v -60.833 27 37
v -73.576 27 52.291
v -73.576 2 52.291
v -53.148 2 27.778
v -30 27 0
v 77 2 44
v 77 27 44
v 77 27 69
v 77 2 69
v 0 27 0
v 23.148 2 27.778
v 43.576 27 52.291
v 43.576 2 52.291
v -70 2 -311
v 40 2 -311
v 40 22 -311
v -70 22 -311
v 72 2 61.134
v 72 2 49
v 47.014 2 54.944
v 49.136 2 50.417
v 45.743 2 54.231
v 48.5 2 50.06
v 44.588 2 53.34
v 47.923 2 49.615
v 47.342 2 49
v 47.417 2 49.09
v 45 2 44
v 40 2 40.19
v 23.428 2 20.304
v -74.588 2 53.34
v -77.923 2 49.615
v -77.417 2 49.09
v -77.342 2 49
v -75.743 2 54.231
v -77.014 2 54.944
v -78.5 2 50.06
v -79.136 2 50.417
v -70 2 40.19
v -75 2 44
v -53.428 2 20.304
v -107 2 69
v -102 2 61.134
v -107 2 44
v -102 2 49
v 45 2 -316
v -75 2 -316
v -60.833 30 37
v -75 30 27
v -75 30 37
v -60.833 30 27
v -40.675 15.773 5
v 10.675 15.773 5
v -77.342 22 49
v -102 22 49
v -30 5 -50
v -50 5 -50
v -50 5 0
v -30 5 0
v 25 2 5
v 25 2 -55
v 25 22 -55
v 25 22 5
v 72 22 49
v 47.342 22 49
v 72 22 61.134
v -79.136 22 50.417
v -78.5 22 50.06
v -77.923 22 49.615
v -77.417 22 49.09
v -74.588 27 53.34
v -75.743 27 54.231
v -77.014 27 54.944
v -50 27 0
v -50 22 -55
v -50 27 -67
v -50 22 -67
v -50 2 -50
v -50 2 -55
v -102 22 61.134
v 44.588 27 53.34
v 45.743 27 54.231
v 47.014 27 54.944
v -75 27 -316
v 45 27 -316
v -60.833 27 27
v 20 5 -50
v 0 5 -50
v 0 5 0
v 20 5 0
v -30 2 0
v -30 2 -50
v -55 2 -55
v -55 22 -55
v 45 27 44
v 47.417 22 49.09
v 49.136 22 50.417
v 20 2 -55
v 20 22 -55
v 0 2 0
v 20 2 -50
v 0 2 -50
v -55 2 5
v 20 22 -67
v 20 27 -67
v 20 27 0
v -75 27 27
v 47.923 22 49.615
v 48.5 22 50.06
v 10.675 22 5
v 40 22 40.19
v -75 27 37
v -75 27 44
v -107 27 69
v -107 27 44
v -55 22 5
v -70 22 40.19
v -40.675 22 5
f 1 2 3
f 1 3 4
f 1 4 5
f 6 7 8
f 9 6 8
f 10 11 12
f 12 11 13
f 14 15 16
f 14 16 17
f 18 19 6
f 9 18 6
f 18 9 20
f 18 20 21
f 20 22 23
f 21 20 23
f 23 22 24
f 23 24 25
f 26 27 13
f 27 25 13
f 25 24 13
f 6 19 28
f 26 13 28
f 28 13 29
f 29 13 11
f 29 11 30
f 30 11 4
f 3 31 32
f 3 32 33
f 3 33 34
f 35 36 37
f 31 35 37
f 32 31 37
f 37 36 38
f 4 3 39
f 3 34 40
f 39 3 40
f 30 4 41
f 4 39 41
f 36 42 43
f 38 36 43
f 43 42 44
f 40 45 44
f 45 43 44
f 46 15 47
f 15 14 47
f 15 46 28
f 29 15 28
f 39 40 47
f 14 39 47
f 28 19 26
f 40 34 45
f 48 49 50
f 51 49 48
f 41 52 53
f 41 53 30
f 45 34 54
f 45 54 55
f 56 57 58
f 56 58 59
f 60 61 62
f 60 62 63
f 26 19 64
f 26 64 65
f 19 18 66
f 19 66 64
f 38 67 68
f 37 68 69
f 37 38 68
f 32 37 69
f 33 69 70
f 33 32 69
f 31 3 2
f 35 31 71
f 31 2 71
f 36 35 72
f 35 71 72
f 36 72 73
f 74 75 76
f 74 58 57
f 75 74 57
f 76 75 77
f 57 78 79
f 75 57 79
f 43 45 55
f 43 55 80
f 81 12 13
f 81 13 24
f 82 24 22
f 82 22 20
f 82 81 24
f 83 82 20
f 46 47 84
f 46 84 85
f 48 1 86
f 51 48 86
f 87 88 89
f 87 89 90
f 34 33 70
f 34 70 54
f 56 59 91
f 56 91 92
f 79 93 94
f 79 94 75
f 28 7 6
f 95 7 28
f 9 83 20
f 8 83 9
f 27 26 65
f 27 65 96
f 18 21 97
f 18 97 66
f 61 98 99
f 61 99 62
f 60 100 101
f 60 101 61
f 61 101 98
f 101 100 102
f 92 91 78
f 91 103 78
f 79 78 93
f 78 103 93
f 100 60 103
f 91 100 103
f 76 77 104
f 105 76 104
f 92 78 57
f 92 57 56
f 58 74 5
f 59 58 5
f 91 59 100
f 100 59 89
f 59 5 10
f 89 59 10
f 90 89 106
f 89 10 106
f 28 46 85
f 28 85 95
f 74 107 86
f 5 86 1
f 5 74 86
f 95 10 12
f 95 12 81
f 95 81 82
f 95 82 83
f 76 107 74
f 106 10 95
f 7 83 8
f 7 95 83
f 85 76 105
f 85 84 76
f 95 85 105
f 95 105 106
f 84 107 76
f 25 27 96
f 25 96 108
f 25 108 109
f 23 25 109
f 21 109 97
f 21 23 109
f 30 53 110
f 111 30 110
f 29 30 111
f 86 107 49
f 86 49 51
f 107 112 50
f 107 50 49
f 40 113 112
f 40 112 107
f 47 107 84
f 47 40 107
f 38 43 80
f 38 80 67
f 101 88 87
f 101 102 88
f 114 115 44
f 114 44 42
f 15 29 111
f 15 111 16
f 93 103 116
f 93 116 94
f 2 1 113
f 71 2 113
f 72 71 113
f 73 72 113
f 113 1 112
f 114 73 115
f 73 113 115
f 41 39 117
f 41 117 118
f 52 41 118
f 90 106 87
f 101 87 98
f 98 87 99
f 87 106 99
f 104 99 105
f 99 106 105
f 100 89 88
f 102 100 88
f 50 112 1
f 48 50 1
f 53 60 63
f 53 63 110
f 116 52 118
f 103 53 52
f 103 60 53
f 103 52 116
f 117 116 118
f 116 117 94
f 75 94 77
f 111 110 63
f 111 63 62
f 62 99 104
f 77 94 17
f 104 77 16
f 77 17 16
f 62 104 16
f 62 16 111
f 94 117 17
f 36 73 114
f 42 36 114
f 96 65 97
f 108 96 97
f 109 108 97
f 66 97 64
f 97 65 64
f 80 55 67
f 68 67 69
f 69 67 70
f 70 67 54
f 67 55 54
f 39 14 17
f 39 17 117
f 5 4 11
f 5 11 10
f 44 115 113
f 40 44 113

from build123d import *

# Parameters (mm, degrees)
BOSS_EXTRUDE1_DEPTH      = 27
CUT_EXTRUDE1_DEPTH       = 29
CUT_EXTRUDE1_DEPTH_BACK  = 70
BOSS_EXTRUDE2_DEPTH      = 27
SKETCH9_W                = 14.166666667
SKETCH9_H                = 10
BOSS_EXTRUDE3_DEPTH      = 3
SKETCH10_W               = 30
SKETCH10_H               = 50
CUT_EXTRUDE7_DEPTH       = 326.898757285
SKETCH11_W               = 20
SKETCH11_H               = 50
CUT_EXTRUDE9_DEPTH       = 22
BOSS_EXTRUDE4_DEPTH      = 27
FILLET1_R                = 10
FILLET2_R                = 10
CUT_EXTRUDE10_DEPTH      = 367.89508037
CUT_EXTRUDE10_DEPTH_BACK = 367.89508037
SKETCH17_W               = 385
SKETCH17_H               = 2
SKETCH18_W               = 20
SKETCH18_H               = 50
CUT_EXTRUDE11_DEPTH      = 22
SHELL1_START             = 2
SHELL1_DEPTH             = 20
SHELL1_START_2           = -55
SHELL1_2_DEPTH           = 80
CUT_EXTRUDE12_DEPTH      = 335.559411764
CUT_EXTRUDE12_DEPTH_BACK = 335.559411764
SKETCH20_W               = 70
SKETCH20_H               = 17


with BuildPart() as part:
    # Sketch1 → Boss-Extrude1 (new body)
    with BuildSketch(Plane(origin=(0, 0, 0), x_dir=(1, 0, 0), z_dir=(0, 1, 0))):
        Polygon((-30, 0), (-55, -30), (-15, -30), (-15, 0), align=None)
        Polygon((-15, 0), (-15, -30), (25, -30), (0, 0), align=None)
    extrude(amount=BOSS_EXTRUDE1_DEPTH)

    # Sketch3 → Cut-Extrude1 (cut, two sides: drawn at the far end of the back side and taken through both)
    with BuildSketch(Plane(origin=(0, 0, 0), x_dir=(0, 0, -1), z_dir=(1, 0, 0)).offset(-CUT_EXTRUDE1_DEPTH_BACK)):
        Polygon((-30, 0), (0, 27), (-30, 27), align=None)
    extrude(amount=CUT_EXTRUDE1_DEPTH + CUT_EXTRUDE1_DEPTH_BACK, mode=Mode.SUBTRACT)

    # Sketch5 → Boss-Extrude2 (add)
    with BuildSketch(Plane(origin=(0, 0, 0), x_dir=(1, 0, 0), z_dir=(0, 1, 0))):
        Polygon((-55, -30), (-75, -54), (-75, 316), (45, 316), (45, -54), (25, -30), (0, 0), (-30, 0), align=None)
    extrude(amount=BOSS_EXTRUDE2_DEPTH)

    # Sketch9 → Boss-Extrude3 (add)
    with BuildSketch(Plane(origin=(0, 27, 0), x_dir=(1, 0, 0), z_dir=(0, 1, 0))):
        with Locations((-67.916666667, -32)):
            Rectangle(SKETCH9_W, SKETCH9_H)
    extrude(amount=BOSS_EXTRUDE3_DEPTH)

    # Sketch10 → Cut-Extrude7 (cut, through all)
    with BuildSketch(Plane(origin=(0, 27, 0), x_dir=(1, 0, 0), z_dir=(0, 1, 0))):
        with Locations((-15, 25)):
            Rectangle(SKETCH10_W, SKETCH10_H)
    extrude(amount=-CUT_EXTRUDE7_DEPTH, mode=Mode.SUBTRACT)

    # Sketch11 → Cut-Extrude9 (cut)
    with BuildSketch(Plane(origin=(0, 27, 0), x_dir=(1, 0, 0), z_dir=(0, 1, 0))):
        with Locations((-40, 25)):
            Rectangle(SKETCH11_W, SKETCH11_H)
    extrude(amount=-CUT_EXTRUDE9_DEPTH, mode=Mode.SUBTRACT)

    # Sketch16 → Boss-Extrude4 (add)
    with BuildSketch(Plane(origin=(0, 27, 0), x_dir=(1, 0, 0), z_dir=(0, 1, 0))):
        Polygon((-75, -54), (-107, -69), (-107, -54), (-107, -44), (-75, -44), align=None)
    boss_extrude4 = extrude(amount=-BOSS_EXTRUDE4_DEPTH)

    # Mirror1: Boss-Extrude4 across plane
    add(boss_extrude4.mirror(Plane.ZY.offset(15)))

    # Fillet1
    fillet1_edges = [part.edges().sort_by_distance(p)[0] for p in [
        (-75, 13.5, 54),
    ]]
    fillet(fillet1_edges, radius=FILLET1_R)

    # Fillet2
    fillet2_edges = [part.edges().sort_by_distance(p)[0] for p in [
        (45, 13.5, 54),
    ]]
    fillet(fillet2_edges, radius=FILLET2_R)

    # Sketch17 → Cut-Extrude10 (cut, two sides: drawn at the far end of the back side and taken through both)
    with BuildSketch(Plane(origin=(77, 0, 0), x_dir=(0, 0, -1), z_dir=(1, 0, 0)).offset(-CUT_EXTRUDE10_DEPTH_BACK)):
        with Locations((123.5, 1)):
            Rectangle(SKETCH17_W, SKETCH17_H)
    extrude(amount=CUT_EXTRUDE10_DEPTH + CUT_EXTRUDE10_DEPTH_BACK, mode=Mode.SUBTRACT)

    # Sketch18 → Cut-Extrude11 (cut)
    with BuildSketch(Plane(origin=(0, 27, 0), x_dir=(1, 0, 0), z_dir=(0, 1, 0))):
        with Locations((10, 25)):
            Rectangle(SKETCH18_W, SKETCH18_H)
    extrude(amount=-CUT_EXTRUDE11_DEPTH, mode=Mode.SUBTRACT)

    # Shell1: read off the stored shape, not the designer's step
    # Shell1 outline → Shell1 (cut)
    with BuildSketch(Plane(origin=(0, 0, 0), x_dir=(1, 0, 0), z_dir=(0, 1, 0)).offset(SHELL1_START)):
        Polygon((25, 55), (25, -5), (10.675208063, -5), (40, -40.189750324), (40, 311), (-70, 311), (-70, -40.189750324), (-40.675208063, -5), (-55, -5), (-55, 55), align=None)
        with BuildLine():
            Line((47.34187473, -49), (47.417185838, -49.090373329))
            ThreePointArc((47.417185838, -49.090373329), (48.203790537, -49.847988861), (49.136122855, -50.416746011))
            Line((49.136122855, -50.416746011), (72, -61.134188423))
            Line((72, -61.134188423), (72, -49))
            Line((72, -49), (47.34187473, -49))
        make_face()
        with BuildLine():
            Line((-77.417185838, -49.090373329), (-77.34187473, -49))
            Line((-77.34187473, -49), (-102, -49))
            Line((-102, -49), (-102, -61.134188423))
            Line((-102, -61.134188423), (-79.136122855, -50.416746011))
            ThreePointArc((-79.136122855, -50.416746011), (-78.203790537, -49.847988861), (-77.417185838, -49.090373329))
        make_face()
    extrude(amount=SHELL1_DEPTH, mode=Mode.SUBTRACT)

    # Shell1 2 outline → Shell1 2 (cut)
    with BuildSketch(Plane.YZ.offset(SHELL1_START_2)):
        Polygon((2, 5), (15.773187976, 5), (2, 20.303542196), align=None)
    extrude(amount=SHELL1_2_DEPTH, mode=Mode.SUBTRACT)

    # Sketch20 → Cut-Extrude12 (cut, two sides: drawn at the far end of the back side and taken through both)
    with BuildSketch(Plane(origin=(0, 27, 0), x_dir=(1, 0, 0), z_dir=(0, 1, 0)).offset(-CUT_EXTRUDE12_DEPTH_BACK)):
        with Locations((-15, 58.5)):
            Rectangle(SKETCH20_W, SKETCH20_H)
    extrude(amount=CUT_EXTRUDE12_DEPTH + CUT_EXTRUDE12_DEPTH_BACK, mode=Mode.SUBTRACT)


solid = part.part
